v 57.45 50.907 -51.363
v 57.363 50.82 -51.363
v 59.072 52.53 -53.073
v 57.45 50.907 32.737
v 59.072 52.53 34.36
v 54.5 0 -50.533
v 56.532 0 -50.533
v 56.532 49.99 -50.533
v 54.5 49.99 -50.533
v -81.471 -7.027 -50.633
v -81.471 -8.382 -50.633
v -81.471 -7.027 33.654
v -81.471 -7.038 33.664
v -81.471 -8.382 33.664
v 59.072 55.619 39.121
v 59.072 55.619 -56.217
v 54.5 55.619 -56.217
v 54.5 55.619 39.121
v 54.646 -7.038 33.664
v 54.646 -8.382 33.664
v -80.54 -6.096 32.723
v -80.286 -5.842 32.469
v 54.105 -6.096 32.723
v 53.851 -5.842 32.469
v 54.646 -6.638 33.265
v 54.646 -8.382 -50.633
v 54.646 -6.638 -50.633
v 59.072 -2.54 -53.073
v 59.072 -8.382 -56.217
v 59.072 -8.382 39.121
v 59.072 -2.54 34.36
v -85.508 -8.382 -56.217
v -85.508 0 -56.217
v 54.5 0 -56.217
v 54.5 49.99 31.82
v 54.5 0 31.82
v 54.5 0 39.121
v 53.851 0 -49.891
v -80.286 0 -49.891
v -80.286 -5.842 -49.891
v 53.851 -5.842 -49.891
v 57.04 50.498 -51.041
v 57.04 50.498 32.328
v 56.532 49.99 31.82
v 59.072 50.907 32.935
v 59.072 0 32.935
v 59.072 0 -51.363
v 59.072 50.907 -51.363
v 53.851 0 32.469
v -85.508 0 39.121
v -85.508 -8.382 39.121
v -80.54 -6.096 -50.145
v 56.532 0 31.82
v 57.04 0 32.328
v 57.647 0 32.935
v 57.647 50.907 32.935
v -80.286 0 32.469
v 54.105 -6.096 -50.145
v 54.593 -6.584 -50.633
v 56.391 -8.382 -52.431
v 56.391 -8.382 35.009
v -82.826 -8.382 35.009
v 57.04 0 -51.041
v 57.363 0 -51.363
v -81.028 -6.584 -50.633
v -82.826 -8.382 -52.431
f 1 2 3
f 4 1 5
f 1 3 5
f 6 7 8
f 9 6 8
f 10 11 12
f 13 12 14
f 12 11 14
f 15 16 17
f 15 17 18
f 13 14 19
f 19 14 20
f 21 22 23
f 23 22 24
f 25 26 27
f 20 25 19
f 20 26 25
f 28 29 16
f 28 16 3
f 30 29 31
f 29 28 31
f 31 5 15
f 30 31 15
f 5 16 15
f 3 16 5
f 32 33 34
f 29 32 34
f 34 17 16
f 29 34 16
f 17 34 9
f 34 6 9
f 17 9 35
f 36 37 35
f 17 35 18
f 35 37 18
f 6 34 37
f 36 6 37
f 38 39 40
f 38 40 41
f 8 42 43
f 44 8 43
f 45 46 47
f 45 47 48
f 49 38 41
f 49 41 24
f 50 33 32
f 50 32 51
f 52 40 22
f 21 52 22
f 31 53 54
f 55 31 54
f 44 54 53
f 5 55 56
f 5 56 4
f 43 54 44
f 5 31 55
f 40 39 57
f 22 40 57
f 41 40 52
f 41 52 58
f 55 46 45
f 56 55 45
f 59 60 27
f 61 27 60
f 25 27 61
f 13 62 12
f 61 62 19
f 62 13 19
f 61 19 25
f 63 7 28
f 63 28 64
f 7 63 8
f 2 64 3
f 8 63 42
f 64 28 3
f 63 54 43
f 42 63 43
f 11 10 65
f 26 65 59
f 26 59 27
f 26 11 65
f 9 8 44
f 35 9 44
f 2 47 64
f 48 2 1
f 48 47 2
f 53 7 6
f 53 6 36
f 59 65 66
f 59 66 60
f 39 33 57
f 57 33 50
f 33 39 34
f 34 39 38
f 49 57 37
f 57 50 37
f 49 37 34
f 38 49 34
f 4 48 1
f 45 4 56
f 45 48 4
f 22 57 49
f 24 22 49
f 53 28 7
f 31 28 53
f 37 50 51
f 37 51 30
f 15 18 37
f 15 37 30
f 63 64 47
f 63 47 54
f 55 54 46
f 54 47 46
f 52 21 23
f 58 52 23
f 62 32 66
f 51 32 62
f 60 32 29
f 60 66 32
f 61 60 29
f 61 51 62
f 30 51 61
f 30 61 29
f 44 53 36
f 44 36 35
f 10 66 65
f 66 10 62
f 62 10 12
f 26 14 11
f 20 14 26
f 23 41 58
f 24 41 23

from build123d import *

# Parameters (mm, degrees)
F0_W     = 144.580562
F0_H     = 95.337302
F0_W_2   = 134.136807
F0_H_2   = 82.360171
F1_DEPTH = 8.382
F2_W     = 64.001322
F2_H     = 95.337302
F2_W_2   = 49.989581
F2_H_2   = 82.352217
F3_DEPTH = 4.572
F4_SIZE  = 2.54
F5_W     = 50.907161
F5_H     = 84.29788
F6_DEPTH = 2.032
F7_SIZE  = 2.54
F8_W     = 136.117357
F8_H     = 84.297877
F9_DEPTH = 2.286


with BuildPart() as f1:
    # F0 (on Front) → F1 (new body)
    with BuildSketch(Plane.XZ):
        with Locations((-13.217857, -8.547984)):
            Rectangle(F0_W, F0_H)
        with Locations((-13.217868, -8.711174)):
            Rectangle(F0_W_2, F0_H_2, mode=Mode.SUBTRACT)
    extrude(amount=F1_DEPTH)

    # F2 (on face) → F3 (join)
    with BuildSketch(Plane.YZ.offset(59.072424)):
        with Locations((23.618661, -8.547984)):
            Rectangle(F2_W, F2_H)
        with Locations((24.994791, -9.356501)):
            Rectangle(F2_W_2, F2_H_2, mode=Mode.SUBTRACT)
    extrude(amount=-F3_DEPTH)

    # F4
    f4_edges = [f1.edges().sort_by_distance(p)[0] for p in [
        (59.072424, 0, -9.356501),
        (59.072424, 24.994791, 31.819608),
        (59.072424, 49.989581, -9.356501),
        (59.072424, 24.994791, -50.532609),
    ]]
    chamfer(f4_edges, length=F4_SIZE)

    # F5 (on face) → F6 (join)
    with BuildSketch(Plane.YZ.offset(59.072424)):
        with Locations((25.45358, -9.214379)):
            Rectangle(F5_W, F5_H)
    extrude(amount=-F6_DEPTH)

    # F7
    f7_edges = [f1.edges().sort_by_distance(p)[0] for p in [
        (-13.217868, -8.382, 32.468911),
        (-80.286272, -8.382, -8.711174),
        (-13.217868, -8.382, -49.89126),
        (53.850535, -8.382, -8.711174),
    ]]
    chamfer(f7_edges, length=F7_SIZE)

    # F8 (on face) → F9 (join)
    with BuildSketch(Plane.XZ.offset(8.382)):
        with Locations((-13.412287, -8.484526)):
            Rectangle(F8_W, F8_H)
    extrude(amount=-F9_DEPTH)


solid = f1.part
